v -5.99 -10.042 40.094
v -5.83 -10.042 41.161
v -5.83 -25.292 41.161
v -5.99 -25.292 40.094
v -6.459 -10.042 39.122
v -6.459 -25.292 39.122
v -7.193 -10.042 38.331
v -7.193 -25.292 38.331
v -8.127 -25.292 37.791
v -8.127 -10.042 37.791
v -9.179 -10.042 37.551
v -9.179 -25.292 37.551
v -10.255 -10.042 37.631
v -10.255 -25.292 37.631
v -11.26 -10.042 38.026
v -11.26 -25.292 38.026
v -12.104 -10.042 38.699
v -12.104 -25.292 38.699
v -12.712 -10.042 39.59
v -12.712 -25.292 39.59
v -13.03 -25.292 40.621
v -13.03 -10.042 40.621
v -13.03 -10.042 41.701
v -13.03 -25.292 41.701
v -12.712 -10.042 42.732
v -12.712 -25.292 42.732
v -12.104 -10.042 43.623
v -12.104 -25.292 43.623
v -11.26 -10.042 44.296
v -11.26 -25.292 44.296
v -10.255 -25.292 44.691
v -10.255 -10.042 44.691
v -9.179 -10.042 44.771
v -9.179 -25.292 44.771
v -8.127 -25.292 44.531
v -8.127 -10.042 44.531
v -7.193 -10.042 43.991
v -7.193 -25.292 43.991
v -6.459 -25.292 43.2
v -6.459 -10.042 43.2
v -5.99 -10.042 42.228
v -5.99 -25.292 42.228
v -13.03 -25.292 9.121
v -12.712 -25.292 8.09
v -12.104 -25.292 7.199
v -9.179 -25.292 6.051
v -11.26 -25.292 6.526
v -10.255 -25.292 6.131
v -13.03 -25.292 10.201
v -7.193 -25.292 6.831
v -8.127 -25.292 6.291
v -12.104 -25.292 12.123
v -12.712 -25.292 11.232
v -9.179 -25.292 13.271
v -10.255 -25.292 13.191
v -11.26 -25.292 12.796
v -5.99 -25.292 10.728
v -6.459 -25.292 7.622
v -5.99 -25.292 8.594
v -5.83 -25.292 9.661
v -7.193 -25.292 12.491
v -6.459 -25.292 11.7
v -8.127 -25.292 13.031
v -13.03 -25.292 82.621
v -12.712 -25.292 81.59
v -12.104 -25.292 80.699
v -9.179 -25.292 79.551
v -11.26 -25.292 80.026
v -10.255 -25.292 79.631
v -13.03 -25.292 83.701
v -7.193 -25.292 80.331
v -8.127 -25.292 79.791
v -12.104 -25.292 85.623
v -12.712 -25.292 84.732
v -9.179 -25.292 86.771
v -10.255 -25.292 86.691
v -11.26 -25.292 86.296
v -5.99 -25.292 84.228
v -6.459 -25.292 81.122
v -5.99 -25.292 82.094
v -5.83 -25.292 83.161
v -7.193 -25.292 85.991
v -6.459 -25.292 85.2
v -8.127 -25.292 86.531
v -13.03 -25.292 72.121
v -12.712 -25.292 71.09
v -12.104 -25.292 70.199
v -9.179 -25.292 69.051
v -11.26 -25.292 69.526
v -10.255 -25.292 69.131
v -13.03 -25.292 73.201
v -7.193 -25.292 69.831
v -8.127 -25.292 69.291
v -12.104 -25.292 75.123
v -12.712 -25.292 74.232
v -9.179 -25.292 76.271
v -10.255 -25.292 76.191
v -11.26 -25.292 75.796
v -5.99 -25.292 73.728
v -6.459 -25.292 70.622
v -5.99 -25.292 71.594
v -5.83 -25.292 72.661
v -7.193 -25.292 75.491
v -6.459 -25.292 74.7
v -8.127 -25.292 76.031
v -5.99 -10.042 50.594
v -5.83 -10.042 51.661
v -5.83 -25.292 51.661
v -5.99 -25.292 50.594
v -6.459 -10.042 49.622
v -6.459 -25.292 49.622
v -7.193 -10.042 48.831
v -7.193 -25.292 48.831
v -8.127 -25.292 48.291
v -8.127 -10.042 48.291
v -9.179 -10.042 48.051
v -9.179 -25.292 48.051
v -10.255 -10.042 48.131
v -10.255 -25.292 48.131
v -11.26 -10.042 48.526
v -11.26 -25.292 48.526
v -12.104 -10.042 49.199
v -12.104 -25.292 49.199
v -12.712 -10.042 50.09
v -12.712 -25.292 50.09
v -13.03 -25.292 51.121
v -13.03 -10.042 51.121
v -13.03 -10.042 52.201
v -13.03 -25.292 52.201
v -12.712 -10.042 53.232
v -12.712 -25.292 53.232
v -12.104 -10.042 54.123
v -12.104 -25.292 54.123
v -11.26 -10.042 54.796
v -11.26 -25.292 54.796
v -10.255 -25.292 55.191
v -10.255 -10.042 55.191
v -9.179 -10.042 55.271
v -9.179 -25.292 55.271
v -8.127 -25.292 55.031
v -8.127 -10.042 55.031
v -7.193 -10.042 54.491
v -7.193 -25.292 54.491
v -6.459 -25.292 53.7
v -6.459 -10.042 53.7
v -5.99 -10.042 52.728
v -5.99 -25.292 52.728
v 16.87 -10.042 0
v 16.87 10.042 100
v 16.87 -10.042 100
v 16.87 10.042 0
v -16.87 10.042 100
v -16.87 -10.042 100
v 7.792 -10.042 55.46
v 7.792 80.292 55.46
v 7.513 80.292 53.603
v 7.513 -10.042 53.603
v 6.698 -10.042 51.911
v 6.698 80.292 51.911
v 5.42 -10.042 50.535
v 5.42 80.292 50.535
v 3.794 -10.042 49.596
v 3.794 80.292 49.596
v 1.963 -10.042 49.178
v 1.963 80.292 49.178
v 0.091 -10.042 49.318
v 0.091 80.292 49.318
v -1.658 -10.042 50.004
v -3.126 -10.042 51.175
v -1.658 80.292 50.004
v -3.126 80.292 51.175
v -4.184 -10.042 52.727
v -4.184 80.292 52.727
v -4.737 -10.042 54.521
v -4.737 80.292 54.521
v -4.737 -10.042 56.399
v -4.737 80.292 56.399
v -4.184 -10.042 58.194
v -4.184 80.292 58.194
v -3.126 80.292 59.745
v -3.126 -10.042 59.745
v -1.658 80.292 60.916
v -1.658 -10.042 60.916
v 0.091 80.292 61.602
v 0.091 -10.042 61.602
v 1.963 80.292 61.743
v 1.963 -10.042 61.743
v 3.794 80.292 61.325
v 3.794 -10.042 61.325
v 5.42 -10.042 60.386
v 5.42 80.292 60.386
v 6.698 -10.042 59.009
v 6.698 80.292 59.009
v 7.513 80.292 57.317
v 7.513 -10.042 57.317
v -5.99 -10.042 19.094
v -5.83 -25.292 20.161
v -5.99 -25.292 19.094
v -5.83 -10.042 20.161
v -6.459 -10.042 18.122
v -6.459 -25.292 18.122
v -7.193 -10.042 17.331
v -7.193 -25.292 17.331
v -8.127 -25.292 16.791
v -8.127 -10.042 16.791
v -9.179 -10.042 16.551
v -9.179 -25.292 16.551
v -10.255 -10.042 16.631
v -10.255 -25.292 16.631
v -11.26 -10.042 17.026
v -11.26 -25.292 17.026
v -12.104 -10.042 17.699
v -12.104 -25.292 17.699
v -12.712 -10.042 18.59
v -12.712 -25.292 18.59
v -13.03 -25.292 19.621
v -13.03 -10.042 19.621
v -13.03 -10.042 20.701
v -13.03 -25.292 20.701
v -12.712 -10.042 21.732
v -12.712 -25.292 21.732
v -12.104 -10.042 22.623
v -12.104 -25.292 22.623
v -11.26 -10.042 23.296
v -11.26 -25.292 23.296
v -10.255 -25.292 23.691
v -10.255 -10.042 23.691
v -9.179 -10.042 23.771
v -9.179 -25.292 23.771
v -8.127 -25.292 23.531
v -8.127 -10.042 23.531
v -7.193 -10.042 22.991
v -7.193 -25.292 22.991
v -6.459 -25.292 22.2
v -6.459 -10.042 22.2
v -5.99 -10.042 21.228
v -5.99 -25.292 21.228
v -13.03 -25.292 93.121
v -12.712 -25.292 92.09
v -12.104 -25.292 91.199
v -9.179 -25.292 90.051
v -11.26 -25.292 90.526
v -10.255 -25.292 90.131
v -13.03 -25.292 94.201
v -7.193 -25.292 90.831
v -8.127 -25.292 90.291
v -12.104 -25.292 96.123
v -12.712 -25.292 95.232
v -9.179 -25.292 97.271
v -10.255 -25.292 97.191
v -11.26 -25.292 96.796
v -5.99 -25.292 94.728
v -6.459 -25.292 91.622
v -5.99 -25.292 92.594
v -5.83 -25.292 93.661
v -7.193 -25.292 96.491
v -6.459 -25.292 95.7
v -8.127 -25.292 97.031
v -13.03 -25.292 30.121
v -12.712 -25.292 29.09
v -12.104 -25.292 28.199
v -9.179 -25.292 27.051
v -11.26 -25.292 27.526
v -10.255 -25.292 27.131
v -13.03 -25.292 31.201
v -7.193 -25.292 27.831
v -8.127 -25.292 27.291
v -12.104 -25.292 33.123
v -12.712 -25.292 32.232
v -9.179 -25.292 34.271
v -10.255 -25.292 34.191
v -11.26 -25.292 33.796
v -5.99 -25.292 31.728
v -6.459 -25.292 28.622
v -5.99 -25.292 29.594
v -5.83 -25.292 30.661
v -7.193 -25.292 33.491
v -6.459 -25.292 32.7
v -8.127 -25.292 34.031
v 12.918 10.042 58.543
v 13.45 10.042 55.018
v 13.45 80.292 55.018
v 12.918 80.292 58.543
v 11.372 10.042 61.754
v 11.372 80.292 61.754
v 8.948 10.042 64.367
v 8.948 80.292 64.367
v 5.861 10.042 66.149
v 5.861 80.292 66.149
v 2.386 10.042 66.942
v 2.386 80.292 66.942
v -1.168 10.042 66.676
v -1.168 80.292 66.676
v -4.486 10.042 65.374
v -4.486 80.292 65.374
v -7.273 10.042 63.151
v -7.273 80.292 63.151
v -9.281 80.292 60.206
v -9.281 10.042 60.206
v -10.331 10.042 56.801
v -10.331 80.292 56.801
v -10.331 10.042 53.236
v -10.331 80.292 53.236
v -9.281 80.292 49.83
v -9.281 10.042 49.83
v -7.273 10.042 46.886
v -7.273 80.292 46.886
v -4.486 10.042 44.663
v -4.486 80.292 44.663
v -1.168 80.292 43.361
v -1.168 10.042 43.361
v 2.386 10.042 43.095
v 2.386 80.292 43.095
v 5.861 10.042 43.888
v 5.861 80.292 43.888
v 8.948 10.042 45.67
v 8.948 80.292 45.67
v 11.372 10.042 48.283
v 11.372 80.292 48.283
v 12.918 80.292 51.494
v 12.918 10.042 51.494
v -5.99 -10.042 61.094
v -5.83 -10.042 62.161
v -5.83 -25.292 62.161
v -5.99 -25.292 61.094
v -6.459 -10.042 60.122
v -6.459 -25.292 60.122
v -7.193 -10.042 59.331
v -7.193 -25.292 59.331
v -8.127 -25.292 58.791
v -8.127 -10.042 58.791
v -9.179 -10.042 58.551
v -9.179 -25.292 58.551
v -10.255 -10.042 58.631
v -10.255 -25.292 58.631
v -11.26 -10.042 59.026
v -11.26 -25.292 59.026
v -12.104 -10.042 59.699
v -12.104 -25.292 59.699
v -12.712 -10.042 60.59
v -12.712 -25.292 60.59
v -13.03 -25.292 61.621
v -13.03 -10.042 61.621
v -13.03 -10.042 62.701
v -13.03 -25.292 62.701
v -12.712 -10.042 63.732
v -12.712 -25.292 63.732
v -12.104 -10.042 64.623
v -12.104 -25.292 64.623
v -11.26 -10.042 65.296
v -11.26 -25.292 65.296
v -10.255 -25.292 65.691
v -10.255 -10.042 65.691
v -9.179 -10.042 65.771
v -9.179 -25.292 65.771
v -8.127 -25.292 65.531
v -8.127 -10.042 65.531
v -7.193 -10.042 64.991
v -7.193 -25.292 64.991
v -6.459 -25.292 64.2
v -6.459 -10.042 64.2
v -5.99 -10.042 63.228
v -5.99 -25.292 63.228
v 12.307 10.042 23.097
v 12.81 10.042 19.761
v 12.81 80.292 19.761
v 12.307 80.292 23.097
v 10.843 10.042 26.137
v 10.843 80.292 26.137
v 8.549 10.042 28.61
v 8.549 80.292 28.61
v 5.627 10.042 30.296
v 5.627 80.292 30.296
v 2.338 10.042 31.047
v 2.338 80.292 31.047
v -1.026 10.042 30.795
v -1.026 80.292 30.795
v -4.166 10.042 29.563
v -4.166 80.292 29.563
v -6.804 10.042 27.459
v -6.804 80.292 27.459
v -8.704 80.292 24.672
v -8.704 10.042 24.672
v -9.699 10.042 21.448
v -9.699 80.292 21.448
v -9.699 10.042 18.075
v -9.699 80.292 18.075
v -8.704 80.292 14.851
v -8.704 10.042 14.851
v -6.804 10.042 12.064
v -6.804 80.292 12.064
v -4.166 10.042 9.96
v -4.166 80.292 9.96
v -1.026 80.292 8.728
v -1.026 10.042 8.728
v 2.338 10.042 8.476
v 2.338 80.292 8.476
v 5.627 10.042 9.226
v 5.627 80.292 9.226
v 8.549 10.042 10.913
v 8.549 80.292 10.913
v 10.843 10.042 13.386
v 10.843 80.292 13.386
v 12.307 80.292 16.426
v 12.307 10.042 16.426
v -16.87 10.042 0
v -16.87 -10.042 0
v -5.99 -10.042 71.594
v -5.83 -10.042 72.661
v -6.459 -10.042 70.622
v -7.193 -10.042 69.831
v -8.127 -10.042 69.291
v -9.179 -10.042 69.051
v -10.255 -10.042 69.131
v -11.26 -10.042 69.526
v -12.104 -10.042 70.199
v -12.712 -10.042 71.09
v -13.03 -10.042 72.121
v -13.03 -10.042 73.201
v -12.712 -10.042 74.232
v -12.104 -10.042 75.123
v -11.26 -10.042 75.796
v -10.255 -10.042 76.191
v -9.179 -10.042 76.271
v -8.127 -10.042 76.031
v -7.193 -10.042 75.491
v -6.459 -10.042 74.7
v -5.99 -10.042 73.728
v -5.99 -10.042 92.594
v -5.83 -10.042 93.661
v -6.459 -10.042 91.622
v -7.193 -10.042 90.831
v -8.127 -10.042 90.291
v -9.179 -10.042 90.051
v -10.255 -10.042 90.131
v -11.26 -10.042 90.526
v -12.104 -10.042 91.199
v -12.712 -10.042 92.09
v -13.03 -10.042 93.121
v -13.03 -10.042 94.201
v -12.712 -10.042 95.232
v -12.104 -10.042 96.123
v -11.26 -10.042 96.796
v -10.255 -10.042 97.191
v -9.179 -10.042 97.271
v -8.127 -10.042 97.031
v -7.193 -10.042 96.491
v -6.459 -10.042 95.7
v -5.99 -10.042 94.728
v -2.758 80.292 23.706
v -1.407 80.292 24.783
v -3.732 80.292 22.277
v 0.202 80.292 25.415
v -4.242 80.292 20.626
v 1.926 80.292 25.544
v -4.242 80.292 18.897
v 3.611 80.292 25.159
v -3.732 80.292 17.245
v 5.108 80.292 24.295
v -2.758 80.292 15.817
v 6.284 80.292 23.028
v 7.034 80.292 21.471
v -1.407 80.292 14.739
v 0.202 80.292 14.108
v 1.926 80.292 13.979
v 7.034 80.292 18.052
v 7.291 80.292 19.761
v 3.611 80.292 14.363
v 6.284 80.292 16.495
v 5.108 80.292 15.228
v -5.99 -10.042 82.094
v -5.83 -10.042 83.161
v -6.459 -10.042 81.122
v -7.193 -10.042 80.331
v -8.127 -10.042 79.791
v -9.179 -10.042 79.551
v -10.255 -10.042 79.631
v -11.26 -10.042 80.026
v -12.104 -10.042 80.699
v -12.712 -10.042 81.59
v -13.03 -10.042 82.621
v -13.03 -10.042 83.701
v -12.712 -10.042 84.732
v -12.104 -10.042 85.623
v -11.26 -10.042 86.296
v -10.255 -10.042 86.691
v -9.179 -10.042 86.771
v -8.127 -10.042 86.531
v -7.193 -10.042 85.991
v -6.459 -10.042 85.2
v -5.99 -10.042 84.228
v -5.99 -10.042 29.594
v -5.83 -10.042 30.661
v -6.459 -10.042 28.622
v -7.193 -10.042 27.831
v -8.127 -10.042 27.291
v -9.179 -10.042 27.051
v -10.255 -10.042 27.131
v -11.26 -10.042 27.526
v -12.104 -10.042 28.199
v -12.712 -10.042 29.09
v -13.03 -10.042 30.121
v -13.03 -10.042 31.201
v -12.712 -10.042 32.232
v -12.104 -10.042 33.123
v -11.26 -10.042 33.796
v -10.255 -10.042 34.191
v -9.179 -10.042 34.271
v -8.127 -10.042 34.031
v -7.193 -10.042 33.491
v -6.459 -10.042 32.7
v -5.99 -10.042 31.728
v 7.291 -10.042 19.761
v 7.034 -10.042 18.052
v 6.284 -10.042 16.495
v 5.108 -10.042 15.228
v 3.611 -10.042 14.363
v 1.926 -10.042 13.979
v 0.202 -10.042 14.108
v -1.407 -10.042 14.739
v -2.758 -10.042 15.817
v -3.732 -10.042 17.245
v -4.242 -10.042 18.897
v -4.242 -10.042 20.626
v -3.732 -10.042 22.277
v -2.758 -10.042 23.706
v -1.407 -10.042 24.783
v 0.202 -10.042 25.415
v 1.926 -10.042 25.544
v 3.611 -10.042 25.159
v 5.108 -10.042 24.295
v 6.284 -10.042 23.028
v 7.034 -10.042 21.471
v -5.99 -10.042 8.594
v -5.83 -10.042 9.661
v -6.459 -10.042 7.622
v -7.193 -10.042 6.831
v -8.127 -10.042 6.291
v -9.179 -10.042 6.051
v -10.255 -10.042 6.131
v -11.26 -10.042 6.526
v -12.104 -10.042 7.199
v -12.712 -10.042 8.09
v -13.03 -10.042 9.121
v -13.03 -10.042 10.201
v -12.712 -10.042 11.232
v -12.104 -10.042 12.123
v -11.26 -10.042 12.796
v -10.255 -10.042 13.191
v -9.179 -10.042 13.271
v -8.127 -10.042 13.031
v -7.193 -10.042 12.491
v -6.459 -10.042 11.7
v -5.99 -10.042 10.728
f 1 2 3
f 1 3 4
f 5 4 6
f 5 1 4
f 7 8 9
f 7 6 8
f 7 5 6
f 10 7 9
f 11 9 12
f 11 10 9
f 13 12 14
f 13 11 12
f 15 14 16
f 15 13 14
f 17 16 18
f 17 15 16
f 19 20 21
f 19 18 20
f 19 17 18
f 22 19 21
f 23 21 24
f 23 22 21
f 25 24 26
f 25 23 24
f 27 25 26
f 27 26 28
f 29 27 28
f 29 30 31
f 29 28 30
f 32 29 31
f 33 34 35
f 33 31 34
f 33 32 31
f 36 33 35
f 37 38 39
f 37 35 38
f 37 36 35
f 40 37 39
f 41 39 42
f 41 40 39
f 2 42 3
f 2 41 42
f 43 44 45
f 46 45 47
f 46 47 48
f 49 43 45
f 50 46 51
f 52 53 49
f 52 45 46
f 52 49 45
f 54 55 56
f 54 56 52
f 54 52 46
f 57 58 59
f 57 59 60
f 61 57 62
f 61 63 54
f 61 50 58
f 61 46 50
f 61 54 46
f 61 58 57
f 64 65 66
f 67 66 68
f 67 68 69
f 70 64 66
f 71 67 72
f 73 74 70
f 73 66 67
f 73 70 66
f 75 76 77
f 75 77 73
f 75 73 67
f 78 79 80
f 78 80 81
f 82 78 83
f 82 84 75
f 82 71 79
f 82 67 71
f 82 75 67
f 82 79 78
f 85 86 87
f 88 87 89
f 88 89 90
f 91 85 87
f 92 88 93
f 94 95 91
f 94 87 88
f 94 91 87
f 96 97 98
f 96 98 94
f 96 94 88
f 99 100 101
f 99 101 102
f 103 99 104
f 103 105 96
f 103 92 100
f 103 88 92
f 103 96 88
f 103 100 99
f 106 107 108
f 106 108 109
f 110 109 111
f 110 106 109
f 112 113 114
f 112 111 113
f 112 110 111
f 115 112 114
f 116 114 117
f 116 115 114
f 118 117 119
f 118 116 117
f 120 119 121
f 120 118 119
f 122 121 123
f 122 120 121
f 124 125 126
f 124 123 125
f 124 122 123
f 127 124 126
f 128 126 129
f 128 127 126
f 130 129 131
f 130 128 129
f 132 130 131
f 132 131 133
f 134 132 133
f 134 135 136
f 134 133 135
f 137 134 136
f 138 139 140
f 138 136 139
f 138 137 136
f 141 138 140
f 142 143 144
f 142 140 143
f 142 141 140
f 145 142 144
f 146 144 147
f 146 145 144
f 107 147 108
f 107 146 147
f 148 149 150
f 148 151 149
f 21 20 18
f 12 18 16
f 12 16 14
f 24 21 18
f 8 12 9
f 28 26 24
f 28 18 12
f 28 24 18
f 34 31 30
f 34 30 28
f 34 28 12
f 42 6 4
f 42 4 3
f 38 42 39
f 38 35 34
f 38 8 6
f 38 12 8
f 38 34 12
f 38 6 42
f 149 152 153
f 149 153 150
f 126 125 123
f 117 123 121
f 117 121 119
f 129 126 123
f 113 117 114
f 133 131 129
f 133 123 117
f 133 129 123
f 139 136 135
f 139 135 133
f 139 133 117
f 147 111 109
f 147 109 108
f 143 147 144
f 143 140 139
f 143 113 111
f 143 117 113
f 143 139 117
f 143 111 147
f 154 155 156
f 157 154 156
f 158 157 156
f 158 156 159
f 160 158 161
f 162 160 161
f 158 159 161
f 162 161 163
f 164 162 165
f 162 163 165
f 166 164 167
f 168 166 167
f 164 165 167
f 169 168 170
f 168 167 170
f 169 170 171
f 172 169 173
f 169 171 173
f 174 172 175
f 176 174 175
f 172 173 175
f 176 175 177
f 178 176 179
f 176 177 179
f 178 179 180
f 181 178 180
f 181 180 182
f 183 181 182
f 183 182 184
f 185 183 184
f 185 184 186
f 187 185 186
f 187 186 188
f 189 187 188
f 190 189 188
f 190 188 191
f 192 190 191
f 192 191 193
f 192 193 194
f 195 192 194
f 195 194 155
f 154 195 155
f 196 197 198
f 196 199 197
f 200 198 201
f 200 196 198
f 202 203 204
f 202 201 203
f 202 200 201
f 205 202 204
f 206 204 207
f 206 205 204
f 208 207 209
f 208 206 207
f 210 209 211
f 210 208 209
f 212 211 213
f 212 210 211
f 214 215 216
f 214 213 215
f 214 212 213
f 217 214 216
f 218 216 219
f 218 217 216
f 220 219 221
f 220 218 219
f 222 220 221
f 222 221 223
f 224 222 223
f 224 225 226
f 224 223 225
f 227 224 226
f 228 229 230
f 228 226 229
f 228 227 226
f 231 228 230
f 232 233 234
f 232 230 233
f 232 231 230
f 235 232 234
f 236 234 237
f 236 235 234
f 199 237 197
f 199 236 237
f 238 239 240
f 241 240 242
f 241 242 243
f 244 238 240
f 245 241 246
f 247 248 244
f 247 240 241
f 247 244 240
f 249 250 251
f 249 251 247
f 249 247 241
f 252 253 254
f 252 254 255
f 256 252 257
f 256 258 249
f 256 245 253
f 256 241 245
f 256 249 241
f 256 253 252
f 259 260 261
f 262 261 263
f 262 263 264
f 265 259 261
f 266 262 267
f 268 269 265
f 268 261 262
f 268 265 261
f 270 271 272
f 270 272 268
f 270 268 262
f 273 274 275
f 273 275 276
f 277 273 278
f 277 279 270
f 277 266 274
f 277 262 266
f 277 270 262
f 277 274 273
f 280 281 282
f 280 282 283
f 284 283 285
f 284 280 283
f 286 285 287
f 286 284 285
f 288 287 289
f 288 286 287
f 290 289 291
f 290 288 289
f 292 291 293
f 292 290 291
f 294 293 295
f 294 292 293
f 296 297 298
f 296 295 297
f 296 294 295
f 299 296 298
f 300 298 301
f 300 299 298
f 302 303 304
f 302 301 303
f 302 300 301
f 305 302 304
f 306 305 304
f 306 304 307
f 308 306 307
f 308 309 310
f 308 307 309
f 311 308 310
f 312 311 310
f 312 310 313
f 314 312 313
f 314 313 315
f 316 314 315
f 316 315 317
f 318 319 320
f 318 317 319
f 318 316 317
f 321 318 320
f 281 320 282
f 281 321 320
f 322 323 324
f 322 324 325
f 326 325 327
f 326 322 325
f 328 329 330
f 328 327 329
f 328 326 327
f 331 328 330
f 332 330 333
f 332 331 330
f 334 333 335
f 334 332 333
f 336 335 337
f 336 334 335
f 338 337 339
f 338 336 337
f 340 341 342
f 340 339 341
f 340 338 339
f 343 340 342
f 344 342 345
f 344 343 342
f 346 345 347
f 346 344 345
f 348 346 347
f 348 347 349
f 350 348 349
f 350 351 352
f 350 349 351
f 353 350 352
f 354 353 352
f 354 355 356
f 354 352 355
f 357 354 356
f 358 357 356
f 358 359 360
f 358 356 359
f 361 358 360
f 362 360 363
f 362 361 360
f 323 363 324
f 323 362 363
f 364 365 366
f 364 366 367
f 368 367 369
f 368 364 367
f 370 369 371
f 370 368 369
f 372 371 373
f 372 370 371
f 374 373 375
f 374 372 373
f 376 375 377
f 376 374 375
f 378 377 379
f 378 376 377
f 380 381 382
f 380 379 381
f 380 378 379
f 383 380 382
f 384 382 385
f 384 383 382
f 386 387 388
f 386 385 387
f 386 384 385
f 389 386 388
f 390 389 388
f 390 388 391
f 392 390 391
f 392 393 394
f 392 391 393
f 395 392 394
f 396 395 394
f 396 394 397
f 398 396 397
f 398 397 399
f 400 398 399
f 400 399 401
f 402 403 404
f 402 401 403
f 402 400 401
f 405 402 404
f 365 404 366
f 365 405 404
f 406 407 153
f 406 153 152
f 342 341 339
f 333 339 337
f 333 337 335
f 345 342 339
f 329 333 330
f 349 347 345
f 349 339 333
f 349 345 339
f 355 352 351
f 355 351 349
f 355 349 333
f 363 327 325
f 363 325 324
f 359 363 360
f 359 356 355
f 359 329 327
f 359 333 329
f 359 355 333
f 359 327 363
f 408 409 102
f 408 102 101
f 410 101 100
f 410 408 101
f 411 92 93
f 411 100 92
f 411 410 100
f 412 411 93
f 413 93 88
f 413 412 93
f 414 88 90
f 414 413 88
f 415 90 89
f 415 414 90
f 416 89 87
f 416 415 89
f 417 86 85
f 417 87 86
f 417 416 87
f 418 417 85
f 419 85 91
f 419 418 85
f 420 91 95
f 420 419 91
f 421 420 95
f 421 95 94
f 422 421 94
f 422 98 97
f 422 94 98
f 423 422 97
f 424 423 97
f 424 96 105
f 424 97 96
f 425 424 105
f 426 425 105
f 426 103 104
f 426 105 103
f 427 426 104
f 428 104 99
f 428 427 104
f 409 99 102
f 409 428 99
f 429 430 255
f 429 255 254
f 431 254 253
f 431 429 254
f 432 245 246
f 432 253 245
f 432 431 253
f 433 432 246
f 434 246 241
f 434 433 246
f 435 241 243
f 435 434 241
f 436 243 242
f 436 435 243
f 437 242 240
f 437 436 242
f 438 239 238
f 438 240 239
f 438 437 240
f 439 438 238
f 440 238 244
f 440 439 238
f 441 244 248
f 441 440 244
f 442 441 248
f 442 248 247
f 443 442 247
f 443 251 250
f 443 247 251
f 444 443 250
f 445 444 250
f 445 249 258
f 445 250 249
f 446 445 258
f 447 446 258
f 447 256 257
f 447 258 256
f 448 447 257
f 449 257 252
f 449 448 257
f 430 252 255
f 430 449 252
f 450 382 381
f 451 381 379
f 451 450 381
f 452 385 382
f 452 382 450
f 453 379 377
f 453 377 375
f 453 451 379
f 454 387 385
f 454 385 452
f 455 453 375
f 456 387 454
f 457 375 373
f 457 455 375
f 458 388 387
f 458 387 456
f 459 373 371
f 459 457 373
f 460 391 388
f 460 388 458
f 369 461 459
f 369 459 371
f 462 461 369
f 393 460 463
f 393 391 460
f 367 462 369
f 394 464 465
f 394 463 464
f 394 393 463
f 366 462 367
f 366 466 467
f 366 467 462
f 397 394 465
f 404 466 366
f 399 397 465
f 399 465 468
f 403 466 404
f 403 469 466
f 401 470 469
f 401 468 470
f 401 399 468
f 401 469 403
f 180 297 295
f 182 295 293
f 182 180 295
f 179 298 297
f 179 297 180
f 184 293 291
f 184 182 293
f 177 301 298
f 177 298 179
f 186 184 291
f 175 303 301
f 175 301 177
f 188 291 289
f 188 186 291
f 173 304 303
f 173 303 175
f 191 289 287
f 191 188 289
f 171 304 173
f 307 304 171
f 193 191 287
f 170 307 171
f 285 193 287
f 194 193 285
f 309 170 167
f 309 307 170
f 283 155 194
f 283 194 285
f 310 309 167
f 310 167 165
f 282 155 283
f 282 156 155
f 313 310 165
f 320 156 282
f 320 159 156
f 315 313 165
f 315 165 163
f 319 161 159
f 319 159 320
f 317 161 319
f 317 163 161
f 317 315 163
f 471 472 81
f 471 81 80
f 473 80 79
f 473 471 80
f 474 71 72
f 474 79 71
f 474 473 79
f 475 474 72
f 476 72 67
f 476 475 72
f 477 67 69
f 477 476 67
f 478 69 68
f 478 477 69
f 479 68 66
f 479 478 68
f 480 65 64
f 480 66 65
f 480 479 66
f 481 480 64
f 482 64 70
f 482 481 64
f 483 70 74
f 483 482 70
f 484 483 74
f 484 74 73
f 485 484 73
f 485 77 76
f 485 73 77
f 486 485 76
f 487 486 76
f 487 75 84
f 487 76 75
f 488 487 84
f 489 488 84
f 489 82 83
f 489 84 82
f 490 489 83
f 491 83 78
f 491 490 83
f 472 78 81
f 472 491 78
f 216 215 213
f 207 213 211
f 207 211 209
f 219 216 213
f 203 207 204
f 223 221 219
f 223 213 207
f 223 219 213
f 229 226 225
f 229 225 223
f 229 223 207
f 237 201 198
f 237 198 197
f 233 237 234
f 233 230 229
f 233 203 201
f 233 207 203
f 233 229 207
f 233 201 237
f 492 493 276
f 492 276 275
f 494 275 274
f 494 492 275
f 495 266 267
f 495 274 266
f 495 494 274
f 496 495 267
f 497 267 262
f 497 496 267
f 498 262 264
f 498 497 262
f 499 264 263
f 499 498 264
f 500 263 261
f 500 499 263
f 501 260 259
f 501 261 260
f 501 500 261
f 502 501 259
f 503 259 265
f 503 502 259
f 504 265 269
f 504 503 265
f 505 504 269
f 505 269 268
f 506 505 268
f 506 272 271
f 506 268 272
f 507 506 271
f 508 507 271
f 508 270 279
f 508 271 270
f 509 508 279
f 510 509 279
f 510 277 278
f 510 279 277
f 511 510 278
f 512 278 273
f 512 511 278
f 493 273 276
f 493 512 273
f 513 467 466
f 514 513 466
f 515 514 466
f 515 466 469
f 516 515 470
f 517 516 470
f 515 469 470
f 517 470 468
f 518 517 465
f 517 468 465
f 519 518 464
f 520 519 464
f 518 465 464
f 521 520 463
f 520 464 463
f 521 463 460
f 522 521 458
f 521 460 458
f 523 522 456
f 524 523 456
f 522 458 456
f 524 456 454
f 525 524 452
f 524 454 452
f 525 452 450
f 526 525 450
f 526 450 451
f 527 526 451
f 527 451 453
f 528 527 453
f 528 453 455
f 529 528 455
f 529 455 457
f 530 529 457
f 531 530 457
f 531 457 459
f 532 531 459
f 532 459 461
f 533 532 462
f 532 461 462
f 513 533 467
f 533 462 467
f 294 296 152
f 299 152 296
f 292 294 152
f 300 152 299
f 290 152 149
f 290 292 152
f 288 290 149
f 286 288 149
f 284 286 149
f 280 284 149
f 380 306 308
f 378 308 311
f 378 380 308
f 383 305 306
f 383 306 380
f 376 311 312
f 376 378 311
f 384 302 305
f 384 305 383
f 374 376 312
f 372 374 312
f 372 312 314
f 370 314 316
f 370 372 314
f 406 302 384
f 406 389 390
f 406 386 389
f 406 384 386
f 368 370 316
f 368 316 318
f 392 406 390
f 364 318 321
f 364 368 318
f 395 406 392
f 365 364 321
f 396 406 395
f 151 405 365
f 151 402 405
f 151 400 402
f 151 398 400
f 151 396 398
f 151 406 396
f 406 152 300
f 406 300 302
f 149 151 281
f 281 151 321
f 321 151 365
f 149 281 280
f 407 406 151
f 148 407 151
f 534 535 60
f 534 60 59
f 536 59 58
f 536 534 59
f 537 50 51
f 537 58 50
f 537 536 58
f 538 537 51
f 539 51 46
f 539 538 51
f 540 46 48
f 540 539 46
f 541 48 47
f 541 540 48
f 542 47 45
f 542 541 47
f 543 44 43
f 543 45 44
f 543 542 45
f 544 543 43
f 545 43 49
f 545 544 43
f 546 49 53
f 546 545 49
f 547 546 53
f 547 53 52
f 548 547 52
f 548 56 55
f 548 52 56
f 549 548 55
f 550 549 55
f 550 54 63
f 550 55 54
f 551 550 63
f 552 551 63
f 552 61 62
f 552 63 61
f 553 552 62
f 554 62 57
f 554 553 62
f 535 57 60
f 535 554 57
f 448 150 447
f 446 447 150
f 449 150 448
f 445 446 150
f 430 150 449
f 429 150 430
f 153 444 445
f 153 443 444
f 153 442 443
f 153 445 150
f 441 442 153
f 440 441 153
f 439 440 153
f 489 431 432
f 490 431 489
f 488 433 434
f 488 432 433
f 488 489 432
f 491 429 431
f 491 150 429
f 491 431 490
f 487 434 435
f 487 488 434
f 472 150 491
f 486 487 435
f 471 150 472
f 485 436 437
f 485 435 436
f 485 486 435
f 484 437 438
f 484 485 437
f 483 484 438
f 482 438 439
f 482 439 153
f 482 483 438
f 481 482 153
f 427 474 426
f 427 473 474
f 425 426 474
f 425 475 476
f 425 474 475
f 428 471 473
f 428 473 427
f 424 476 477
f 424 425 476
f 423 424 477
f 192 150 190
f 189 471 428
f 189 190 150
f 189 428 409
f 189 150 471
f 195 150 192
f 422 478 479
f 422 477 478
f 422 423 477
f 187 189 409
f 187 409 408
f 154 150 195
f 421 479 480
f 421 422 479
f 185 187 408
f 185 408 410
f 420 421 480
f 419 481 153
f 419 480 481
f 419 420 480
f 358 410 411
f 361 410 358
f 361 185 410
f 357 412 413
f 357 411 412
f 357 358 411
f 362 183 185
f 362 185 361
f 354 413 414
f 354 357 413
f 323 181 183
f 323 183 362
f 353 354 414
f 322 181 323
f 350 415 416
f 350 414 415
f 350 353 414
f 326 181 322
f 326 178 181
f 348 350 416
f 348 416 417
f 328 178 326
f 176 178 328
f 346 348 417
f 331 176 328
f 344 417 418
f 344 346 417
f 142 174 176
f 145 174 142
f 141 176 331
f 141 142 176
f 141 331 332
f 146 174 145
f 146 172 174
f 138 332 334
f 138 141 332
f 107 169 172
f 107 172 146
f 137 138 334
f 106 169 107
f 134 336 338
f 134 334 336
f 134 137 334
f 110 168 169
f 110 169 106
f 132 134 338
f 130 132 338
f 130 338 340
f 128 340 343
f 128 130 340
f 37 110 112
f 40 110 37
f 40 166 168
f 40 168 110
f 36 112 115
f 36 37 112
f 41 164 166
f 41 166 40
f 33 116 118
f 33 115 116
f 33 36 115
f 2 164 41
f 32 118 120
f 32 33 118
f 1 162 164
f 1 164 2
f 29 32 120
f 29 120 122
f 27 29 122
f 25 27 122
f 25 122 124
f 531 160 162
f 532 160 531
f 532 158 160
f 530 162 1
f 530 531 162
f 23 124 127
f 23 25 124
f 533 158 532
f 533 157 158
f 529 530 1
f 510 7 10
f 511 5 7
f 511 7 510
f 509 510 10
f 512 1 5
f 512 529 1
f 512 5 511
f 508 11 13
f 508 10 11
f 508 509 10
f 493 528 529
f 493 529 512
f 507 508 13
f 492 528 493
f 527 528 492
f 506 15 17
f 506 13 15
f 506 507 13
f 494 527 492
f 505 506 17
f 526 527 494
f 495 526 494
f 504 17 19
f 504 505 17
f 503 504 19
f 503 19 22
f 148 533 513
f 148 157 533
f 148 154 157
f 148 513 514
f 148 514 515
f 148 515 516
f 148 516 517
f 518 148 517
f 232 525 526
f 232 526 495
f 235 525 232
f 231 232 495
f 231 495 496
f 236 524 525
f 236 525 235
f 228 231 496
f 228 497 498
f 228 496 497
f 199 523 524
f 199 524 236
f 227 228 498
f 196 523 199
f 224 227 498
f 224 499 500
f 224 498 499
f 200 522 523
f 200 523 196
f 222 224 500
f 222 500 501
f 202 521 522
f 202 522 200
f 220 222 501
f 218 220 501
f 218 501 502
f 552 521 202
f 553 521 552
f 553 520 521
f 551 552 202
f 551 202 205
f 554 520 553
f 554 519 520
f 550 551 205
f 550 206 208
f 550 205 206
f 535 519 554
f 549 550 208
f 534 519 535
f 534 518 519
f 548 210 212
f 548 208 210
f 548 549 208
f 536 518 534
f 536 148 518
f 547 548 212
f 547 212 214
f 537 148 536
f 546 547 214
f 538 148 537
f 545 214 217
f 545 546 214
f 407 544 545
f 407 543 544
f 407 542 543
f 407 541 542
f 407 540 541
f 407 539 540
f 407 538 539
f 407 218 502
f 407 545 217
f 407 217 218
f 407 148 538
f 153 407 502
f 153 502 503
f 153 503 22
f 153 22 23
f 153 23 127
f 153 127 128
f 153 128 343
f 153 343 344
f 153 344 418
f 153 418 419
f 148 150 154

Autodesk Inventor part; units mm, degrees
ref_plane "YZ Plane" through (0, 0, 0) normal (1, 0, 0) x (0, 1, 0)
ref_plane "XZ Plane" through (0, 0, 0) normal (0, 1, 0) x (-1, 0, 0)
ref_plane "XY Plane" through (0, 0, 0) normal (0, 0, 1) x (1, 0, 0)
sketch "스케치1" plane through (0, 0, 0) normal (0, 0, 1) x (1, 0, 0)
  line L0 (-16.8705, 10.0415) -> (16.8705, 10.0415)
  line L1 (16.8705, 10.0415) -> (16.8705, -10.0415)
  line L2 (16.8705, -10.0415) -> (-16.8705, -10.0415)
  line L3 (-16.8705, -10.0415) -> (-16.8705, 10.0415)
  line L4 (-16.8705, 10.0415) -> (16.8705, -10.0415) construction
  line L5 (16.8705, 10.0415) -> (-16.8705, -10.0415) construction
  point P0 (0, 0)
extrude "돌출1" add sketch "스케치1" along normal blind 100
sketch "스케치2" plane through (-16.8705, 10.0415, 0) normal (0, 1, 0) x (1, 0, 0)
  circle A0 centre (18.3629, -19.7614) radius 11.3174
  circle A1 centre (18.3629, -55.0184) radius 11.9571
  point P0 (16.8705, 0)
extrude "돌출2" add sketch "스케치2" along normal blind 70.25
sketch "스케치3" plane through (1.4924, 80.2915, 19.7614) normal (0, 1, 0) x (1, 0, 0)
  circle A0 centre (0, 0) radius 5.7988
  circle A1 centre (0, -35.6989) radius 6.3
  point P0 (-1.4924, 19.7614)
extrude "돌출3" cut sketch "스케치3" against normal through all
sketch "스케치4" plane through (-16.8705, -10.0415, 0) normal (0, -1, 0) x (1, 0, 0)
  circle A0 centre (7.4206, 93.661) radius 3.6203
  point P0 (16.8705, 0)
extrude "돌출4" add sketch "스케치4" along normal blind 15.25
pattern_linear "직사각형 패턴1" count 9 spacing 10.5 along (0, 0, -1) of "돌출4"
sketch "스케치5" plane through (-16.8705, -10.0415, 0) normal (0, -1, 0) x (1, 0, 0)
  line L0 (27.8588, 94.265) -> (25.5194, 91.9257)
  line L1 (25.5194, 91.9257) -> (27.8178, 89.6273)
  arc A0 (27.8178, 89.6273) -> (27.8178, 91.969) centre (28.9886, 90.7982) ccw
  arc A1 (28.9886, 92.454) -> (27.8372, 93.9543) centre (29.4912, 94.0317) ccw
  arc A2 (29.6562, 92.7123) -> (28.9886, 92.454) centre (29.4017, 92.3783) ccw
  point P0 (16.8705, 0)
properties part number "0315_부품2"
